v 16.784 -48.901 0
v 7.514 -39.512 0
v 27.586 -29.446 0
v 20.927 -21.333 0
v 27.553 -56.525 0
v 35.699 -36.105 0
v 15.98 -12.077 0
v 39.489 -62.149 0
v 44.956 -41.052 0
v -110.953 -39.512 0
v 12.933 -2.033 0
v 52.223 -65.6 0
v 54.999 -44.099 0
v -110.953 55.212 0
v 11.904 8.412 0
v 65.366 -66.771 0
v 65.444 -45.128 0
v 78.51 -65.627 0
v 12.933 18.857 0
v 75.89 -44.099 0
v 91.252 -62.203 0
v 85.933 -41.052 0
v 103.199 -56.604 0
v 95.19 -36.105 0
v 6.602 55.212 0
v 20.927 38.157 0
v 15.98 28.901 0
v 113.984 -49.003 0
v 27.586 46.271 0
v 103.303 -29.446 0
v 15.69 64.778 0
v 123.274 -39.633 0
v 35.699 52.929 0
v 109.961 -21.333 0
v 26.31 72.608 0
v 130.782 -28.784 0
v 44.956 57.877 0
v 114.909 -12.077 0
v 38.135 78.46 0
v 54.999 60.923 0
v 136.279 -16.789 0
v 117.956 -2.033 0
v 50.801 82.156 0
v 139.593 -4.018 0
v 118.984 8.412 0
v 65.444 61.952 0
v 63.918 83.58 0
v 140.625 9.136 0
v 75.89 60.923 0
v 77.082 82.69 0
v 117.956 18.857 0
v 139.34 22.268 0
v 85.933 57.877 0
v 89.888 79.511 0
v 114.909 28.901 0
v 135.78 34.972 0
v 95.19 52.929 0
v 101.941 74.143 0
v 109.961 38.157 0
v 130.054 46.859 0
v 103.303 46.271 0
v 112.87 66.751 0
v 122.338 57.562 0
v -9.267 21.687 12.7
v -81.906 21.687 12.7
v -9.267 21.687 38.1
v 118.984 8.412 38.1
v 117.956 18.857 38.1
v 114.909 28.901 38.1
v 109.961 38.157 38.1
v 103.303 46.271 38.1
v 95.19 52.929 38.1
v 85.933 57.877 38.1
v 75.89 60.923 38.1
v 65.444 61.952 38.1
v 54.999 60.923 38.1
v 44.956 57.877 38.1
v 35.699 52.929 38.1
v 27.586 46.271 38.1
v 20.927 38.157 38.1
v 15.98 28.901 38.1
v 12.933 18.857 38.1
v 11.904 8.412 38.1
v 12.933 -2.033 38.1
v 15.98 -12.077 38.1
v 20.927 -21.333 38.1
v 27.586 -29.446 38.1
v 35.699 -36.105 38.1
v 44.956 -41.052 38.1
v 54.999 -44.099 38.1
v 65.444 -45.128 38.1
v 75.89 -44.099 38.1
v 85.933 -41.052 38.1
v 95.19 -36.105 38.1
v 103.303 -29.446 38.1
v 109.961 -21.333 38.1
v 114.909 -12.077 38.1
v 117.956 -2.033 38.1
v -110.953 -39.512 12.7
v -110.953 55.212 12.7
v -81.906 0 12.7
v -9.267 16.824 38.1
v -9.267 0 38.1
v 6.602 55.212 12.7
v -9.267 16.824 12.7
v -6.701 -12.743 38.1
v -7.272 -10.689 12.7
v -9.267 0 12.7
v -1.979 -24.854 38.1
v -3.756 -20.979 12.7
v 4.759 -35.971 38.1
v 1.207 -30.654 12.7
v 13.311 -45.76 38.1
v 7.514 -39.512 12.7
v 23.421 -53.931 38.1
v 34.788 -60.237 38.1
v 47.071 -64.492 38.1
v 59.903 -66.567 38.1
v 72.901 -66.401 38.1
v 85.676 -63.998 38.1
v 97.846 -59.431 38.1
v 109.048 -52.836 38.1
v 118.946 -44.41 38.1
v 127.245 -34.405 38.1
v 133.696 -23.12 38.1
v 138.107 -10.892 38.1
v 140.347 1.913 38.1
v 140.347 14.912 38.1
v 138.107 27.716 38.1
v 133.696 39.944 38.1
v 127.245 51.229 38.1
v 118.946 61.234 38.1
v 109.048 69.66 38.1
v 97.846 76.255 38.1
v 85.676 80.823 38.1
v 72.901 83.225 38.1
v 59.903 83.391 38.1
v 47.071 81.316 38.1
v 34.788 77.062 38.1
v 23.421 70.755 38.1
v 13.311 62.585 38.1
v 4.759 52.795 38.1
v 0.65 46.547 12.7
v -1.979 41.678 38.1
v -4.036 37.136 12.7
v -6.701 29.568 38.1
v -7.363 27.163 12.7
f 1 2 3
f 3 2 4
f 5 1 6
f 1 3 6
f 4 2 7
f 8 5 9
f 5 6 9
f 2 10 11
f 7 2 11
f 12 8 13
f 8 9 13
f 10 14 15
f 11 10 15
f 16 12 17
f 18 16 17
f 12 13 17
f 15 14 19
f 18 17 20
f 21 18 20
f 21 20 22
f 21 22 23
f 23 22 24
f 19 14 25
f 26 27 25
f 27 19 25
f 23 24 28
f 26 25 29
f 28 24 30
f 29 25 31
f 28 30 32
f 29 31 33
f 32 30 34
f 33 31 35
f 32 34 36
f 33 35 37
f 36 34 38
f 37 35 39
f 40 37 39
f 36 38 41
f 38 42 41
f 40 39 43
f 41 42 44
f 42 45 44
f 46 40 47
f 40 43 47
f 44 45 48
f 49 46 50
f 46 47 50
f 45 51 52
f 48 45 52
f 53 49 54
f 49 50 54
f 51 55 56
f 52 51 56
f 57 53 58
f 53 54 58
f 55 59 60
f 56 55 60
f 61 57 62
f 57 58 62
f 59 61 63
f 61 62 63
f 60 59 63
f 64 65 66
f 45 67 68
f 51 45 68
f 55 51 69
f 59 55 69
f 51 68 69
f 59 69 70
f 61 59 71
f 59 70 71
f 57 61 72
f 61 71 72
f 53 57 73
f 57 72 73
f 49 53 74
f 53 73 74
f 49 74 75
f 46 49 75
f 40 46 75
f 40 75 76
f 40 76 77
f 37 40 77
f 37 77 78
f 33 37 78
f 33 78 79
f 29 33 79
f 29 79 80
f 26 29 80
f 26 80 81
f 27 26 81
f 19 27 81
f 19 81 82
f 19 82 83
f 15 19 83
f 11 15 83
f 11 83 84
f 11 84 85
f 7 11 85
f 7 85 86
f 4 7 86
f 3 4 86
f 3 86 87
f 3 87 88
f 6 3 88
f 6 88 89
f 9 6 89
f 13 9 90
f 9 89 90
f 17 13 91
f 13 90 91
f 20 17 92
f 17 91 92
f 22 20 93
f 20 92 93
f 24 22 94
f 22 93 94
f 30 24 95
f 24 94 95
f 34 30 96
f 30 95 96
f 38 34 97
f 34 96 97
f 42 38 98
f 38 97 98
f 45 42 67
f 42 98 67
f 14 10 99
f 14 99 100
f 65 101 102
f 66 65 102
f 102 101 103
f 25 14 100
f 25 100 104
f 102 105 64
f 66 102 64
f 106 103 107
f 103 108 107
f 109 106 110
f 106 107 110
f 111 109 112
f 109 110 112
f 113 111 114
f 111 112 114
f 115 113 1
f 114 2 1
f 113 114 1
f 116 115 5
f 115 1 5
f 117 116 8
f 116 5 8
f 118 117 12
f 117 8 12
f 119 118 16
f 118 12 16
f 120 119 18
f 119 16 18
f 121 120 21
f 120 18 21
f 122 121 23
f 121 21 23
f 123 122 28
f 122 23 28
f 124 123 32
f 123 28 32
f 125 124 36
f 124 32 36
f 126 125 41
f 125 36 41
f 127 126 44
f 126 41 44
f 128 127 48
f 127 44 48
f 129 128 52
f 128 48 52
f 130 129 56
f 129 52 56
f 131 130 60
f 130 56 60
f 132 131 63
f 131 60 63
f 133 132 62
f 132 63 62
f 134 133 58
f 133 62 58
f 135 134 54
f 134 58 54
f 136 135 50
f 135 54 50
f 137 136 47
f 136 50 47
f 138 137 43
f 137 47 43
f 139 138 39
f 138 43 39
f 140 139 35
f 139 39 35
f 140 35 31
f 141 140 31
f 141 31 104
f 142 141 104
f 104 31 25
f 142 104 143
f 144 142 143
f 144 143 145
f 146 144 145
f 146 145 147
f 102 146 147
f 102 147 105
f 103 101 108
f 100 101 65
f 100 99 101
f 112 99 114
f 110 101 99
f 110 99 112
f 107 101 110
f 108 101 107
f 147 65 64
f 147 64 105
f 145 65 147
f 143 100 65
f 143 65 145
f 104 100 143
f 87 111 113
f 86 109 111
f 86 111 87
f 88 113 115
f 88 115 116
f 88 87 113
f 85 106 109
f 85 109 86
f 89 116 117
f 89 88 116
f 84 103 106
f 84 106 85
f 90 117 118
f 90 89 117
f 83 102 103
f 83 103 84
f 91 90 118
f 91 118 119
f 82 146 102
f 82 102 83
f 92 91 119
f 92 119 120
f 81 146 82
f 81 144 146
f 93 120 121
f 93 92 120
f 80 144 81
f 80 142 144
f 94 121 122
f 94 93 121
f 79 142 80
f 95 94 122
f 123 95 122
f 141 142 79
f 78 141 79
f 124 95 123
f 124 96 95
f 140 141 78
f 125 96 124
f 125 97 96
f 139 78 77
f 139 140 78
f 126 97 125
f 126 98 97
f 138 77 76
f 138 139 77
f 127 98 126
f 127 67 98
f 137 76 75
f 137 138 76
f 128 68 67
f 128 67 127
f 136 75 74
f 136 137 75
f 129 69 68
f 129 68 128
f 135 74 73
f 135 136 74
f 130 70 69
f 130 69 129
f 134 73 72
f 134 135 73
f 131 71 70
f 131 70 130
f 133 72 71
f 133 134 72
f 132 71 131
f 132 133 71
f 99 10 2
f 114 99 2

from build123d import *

# Parameters (mm, degrees)
F0_W      = 158.8544994593
F0_H      = 94.7234593332
F1_DEPTH  = 12.7
F3_DEPTH  = 12.701
F4_R      = 75.1836031241
F5_DEPTH  = 38.1
F6_R      = 53.5400409411
F7_DEPTH  = 38.101
F8_W      = 72.6389752571
F8_H      = 21.686675027
F9_DEPTH  = 25.4
F11_DEPTH = 83.5967873179


with BuildPart() as f1:
    # F0 (on Top) → F1 (new body)
    with BuildSketch(Plane.XY):
        with Locations((-31.5255522728, 7.8500341624)):
            Rectangle(F0_W, F0_H)
    extrude(amount=F1_DEPTH)

    # F2 (on face) → F3 (cut, through all)
    with BuildSketch(Plane.XY.offset(12.7)):
        with BuildLine():
            Line((47.9016974568, -39.5116955042), (47.9016974568, 55.211763829))
            ThreePointArc((47.9016974568, 55.211763829), (16.204565289, 7.8500341624), (47.9016974568, -39.5116955042))
        make_face()
    extrude(amount=-F3_DEPTH, mode=Mode.SUBTRACT)

    # F4 (on Top) → F5 (join)
    with BuildSketch(Plane.XY):
        with Locations((65.4443874955, 8.4121841937)):
            Circle(F4_R)
    extrude(amount=F5_DEPTH)

    # F6 (on face) → F7 (cut, through all)
    with BuildSketch(Plane.XY.offset(38.1)):
        with Locations((65.4443874955, 8.4121841937)):
            Circle(F6_R)
    extrude(amount=-F7_DEPTH, mode=Mode.SUBTRACT)

    # F8 (on face) → F9 (join)
    with BuildSketch(Plane.XY.offset(12.7)):
        with Locations((-45.5866075186, 10.8433375135)):
            Rectangle(F8_W, F8_H)
    extrude(amount=F9_DEPTH)

    # F10 (on face) → F11 (cut, through all)
    with BuildSketch(Plane.XZ):
        Polygon((-81.9060951471, 38.1), (-81.9060951471, 12.7), (-9.26711989, 38.1), align=None)
    extrude(amount=-F11_DEPTH, mode=Mode.SUBTRACT)


solid = f1.part
